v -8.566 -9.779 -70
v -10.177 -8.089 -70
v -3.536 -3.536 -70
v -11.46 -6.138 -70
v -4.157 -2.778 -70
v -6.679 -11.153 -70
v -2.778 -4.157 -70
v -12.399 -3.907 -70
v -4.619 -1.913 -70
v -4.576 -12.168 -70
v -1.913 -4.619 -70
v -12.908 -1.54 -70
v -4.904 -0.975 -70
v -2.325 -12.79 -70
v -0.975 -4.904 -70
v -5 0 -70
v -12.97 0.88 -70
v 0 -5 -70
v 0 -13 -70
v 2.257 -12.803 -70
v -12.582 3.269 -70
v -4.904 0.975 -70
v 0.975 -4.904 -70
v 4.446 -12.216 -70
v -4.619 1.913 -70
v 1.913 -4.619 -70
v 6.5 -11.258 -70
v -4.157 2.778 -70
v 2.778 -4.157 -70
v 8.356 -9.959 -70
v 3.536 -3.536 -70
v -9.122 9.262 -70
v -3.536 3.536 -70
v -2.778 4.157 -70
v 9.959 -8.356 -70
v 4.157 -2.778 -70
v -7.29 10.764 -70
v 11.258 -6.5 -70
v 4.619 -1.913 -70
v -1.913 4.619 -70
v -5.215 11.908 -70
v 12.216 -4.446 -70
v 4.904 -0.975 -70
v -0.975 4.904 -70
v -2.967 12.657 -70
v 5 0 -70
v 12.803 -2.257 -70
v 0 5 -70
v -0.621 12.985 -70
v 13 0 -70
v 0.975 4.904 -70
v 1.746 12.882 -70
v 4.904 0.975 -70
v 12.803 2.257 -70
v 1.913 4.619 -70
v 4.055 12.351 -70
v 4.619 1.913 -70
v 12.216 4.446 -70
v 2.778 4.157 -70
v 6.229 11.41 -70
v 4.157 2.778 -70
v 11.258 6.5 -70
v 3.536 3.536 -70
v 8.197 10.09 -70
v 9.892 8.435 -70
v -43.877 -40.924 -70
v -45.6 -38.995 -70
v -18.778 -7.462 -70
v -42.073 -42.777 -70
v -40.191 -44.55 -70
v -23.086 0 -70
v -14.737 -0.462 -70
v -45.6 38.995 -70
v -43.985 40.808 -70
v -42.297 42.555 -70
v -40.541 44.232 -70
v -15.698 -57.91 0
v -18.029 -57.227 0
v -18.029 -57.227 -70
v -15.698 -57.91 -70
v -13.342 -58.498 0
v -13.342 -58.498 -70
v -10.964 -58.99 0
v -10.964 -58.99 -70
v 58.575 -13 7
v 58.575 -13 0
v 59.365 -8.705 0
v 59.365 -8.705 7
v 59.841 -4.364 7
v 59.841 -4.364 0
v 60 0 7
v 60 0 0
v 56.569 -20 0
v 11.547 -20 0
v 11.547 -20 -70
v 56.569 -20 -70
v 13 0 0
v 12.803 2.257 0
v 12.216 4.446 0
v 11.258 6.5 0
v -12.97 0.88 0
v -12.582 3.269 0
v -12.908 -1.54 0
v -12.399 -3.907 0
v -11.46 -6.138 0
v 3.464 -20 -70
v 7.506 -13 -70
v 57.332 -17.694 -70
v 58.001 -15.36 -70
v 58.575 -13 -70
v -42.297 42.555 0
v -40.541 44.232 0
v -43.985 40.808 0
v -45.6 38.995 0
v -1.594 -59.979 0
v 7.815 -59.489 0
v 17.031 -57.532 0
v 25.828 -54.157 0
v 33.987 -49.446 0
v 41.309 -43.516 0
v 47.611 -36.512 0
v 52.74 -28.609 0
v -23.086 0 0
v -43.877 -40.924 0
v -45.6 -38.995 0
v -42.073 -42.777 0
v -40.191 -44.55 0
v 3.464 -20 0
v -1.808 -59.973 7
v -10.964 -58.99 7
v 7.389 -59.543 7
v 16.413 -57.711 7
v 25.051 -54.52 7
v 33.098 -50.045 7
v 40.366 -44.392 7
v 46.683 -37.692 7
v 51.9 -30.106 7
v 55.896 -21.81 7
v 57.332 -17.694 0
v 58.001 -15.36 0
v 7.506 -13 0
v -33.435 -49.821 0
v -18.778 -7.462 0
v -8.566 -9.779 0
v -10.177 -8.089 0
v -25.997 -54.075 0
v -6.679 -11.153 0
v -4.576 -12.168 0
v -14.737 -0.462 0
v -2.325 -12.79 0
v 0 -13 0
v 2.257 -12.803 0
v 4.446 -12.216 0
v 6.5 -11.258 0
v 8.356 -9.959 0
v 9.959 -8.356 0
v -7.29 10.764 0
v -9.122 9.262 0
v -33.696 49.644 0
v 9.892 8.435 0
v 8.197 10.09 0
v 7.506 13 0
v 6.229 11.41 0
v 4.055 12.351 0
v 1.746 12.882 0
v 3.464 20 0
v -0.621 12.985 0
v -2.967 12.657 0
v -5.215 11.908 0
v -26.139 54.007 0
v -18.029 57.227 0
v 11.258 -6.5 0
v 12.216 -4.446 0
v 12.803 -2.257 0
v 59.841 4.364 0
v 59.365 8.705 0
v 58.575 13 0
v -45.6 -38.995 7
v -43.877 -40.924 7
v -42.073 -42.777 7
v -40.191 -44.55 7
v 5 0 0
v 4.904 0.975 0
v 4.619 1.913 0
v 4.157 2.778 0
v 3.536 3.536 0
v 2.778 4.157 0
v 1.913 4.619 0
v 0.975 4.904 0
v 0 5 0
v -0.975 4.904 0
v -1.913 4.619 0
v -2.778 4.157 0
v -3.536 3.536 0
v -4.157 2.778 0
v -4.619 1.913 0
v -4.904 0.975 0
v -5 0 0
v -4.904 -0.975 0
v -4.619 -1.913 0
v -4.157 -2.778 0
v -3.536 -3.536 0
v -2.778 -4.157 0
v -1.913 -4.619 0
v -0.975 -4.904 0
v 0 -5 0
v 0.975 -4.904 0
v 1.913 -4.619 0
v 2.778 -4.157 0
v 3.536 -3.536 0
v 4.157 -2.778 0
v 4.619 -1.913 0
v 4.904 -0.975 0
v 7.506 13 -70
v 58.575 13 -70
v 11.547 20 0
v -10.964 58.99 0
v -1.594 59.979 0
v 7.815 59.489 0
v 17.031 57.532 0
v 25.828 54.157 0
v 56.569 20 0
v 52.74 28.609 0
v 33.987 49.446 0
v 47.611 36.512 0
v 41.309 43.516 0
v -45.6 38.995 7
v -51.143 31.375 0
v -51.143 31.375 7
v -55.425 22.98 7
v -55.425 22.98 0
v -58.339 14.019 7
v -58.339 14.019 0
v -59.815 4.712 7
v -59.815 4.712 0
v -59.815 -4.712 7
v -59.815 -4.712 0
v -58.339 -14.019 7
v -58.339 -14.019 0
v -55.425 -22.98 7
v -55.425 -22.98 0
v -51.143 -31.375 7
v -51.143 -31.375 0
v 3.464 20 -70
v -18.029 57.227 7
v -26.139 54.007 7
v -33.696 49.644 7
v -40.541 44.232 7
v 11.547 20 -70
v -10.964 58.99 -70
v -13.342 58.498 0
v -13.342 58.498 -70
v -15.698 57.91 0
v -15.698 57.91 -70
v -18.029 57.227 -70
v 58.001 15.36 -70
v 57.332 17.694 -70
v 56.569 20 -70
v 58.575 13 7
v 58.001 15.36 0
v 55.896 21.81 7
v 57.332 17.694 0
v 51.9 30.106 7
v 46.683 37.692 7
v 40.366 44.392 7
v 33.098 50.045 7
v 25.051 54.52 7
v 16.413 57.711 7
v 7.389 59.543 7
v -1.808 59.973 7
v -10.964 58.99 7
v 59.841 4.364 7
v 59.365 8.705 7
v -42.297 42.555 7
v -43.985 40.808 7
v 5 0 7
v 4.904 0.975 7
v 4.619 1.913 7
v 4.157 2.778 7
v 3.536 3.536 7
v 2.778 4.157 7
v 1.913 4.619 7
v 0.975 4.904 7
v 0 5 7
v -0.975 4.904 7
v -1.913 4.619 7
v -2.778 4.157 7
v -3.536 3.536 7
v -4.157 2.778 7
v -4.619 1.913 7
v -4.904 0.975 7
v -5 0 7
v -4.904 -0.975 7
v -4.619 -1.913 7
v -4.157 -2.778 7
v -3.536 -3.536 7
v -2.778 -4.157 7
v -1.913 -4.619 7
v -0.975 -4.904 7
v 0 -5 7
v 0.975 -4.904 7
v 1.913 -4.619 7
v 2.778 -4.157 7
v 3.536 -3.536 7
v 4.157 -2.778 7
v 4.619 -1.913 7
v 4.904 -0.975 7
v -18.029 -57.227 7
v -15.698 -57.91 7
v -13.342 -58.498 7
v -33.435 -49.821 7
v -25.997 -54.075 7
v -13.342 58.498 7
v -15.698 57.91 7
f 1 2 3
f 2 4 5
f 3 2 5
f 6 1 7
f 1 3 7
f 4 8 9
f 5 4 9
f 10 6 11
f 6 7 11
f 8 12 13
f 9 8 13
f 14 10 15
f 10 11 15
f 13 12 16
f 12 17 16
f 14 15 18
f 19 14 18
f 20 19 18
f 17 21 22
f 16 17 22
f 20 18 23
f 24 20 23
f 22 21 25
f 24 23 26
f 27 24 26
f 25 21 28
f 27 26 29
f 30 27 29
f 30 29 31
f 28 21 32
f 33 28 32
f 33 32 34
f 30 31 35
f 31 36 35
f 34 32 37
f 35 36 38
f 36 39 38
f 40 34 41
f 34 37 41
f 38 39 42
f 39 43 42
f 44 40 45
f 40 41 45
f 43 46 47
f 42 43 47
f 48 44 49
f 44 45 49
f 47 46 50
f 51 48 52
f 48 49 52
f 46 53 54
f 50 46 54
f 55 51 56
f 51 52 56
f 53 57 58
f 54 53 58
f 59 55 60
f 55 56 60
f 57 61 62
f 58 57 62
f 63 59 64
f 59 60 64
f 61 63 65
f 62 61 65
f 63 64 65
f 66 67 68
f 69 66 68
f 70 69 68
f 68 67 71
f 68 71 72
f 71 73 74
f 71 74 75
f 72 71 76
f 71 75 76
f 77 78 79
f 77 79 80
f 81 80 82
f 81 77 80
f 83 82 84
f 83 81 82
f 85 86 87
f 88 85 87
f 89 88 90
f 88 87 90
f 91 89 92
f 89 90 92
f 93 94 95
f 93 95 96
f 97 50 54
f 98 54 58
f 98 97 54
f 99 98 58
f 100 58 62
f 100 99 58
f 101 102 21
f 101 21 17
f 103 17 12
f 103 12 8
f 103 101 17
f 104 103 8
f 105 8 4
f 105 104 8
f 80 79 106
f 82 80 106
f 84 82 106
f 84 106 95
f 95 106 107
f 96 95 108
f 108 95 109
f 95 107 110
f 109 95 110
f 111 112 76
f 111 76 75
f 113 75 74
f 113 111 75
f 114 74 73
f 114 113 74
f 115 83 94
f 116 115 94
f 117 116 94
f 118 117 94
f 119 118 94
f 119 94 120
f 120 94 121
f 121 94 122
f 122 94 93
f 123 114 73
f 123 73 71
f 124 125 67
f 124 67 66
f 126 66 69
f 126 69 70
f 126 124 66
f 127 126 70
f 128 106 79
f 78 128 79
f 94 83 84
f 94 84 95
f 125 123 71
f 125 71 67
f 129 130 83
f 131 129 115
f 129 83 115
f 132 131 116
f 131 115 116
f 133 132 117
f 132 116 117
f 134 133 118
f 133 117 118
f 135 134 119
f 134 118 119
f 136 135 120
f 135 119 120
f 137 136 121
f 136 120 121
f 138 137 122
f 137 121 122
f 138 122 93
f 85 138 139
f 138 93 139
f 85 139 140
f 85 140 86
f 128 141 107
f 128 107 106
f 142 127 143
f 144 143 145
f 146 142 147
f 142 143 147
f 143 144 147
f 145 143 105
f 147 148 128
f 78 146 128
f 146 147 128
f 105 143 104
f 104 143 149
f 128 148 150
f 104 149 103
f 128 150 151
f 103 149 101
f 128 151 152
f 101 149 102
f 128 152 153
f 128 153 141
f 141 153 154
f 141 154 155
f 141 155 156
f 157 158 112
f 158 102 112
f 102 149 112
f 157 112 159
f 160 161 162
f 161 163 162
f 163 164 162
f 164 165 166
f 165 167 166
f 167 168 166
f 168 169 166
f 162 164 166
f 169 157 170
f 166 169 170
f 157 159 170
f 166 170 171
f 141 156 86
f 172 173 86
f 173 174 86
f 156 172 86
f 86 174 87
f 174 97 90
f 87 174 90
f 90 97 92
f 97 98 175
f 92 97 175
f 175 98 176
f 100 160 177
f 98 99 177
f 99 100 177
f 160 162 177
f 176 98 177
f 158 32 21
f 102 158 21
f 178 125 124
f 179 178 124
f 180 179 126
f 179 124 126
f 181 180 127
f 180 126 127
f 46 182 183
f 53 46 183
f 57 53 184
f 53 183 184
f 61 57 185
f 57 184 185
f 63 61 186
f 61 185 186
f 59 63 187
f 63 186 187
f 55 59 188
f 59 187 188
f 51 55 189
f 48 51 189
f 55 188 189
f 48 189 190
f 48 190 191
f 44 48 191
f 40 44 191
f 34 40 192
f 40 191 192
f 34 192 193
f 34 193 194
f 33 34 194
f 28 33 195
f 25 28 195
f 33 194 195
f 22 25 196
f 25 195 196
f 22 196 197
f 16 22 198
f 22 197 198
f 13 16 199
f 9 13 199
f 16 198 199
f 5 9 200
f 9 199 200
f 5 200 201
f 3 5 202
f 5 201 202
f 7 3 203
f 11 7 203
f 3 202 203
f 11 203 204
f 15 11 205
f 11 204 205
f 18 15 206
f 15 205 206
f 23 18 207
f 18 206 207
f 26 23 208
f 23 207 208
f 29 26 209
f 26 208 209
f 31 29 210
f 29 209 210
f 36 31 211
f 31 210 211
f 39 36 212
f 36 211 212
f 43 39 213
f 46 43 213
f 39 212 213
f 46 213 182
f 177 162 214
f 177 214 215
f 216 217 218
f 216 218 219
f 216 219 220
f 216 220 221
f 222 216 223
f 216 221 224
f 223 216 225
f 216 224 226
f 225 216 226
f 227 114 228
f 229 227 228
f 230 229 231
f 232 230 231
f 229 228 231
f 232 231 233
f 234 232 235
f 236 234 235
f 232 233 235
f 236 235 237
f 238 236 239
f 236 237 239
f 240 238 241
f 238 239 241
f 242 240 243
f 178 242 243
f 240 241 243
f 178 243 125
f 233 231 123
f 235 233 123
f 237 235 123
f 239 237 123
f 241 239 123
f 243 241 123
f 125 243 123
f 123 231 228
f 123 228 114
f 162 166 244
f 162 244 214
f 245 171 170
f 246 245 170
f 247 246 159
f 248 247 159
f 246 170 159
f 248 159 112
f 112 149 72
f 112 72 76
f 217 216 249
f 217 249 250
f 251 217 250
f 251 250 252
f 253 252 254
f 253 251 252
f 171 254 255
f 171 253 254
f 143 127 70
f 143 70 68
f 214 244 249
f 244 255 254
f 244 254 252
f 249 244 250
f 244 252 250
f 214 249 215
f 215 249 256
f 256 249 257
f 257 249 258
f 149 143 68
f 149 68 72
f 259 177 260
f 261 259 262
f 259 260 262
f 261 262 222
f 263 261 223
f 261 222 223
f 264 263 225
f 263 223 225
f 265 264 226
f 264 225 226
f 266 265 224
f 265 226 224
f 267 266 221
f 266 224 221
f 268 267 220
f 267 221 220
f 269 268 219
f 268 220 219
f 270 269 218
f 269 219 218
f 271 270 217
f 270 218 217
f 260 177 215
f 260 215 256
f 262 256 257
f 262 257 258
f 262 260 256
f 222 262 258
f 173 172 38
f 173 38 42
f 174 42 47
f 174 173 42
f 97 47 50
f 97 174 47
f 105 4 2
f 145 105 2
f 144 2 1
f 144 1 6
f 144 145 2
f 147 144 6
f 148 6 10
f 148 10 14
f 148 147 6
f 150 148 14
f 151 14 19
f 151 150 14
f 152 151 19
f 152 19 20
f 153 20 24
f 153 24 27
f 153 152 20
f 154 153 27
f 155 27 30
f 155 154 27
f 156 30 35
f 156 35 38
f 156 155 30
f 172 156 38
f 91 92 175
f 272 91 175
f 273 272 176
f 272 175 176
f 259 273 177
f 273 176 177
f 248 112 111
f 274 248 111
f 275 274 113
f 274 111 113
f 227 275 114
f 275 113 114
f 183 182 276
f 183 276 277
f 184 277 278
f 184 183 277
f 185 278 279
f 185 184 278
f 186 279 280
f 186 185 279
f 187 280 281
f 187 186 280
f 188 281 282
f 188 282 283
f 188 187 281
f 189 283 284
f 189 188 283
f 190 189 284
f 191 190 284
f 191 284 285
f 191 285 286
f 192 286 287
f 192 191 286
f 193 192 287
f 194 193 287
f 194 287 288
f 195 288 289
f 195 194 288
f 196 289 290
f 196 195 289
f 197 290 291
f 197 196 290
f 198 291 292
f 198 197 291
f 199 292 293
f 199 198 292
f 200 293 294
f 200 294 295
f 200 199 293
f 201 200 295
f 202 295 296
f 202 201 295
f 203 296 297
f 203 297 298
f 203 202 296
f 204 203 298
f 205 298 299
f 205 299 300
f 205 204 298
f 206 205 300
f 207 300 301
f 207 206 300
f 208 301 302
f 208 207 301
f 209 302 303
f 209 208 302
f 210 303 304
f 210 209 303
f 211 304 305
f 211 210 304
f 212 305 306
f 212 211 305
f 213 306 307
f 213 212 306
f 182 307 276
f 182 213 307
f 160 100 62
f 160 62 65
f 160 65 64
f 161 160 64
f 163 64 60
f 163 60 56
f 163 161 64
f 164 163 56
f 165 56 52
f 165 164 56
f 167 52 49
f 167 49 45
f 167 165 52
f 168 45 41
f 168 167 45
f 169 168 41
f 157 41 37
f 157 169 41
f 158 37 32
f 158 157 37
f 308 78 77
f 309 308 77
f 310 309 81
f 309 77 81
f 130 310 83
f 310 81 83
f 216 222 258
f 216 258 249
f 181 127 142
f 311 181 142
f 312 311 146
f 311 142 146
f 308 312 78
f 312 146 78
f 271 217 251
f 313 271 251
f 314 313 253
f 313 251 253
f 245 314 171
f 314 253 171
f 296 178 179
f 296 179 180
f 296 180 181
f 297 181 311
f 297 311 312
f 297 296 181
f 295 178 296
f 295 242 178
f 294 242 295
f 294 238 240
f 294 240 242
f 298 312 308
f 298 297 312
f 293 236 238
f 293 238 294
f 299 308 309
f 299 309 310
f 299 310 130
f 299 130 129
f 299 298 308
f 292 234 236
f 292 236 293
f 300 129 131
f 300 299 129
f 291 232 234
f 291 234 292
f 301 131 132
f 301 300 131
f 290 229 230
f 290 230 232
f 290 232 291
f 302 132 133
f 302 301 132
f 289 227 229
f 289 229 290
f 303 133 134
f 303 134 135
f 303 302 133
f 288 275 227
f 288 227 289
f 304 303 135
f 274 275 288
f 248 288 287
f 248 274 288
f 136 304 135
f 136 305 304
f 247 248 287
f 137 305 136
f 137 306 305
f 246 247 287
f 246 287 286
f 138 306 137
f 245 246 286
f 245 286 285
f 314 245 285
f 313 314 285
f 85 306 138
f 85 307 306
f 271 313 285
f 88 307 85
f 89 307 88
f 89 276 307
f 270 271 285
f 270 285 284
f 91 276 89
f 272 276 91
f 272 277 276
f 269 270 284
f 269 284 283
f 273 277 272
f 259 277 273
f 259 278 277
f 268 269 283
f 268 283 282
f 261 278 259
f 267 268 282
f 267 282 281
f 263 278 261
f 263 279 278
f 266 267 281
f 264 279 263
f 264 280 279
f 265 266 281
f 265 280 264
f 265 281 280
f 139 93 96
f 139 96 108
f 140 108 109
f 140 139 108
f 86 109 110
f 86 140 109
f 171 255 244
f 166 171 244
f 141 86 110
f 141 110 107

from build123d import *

# Parameters (mm, degrees)
F0_R     = 5
F1_DEPTH = 7
F2_DEPTH = 70


# Not quite as in the source:
# - after a boolean that leaves OpenCascade's solid faulty, fix() repairs it


with BuildPart() as f1:
    # F0 (on Top) → F1 (new body)
    with BuildSketch(Plane.XY):
        with BuildLine():
            Line((11.5470053838, 20), (56.5685424949, 20))
            ThreePointArc((56.5685424949, 20), (30, 51.9615242271), (-10.9637631718, 58.9897948557))
            Line((-10.9637631718, 58.9897948557), (11.5470053838, 20))
        make_face()
        with BuildLine():
            ThreePointArc((-10.9637631718, -58.9897948557), (30, -51.9615242271), (56.5685424949, -20))
            Line((56.5685424949, -20), (11.5470053838, -20))
            Line((11.5470053838, -20), (-10.9637631718, -58.9897948557))
        make_face()
        with BuildLine():
            ThreePointArc((58.5747385824, -13), (59.6426203103, -6.5389481208), (60, 0))
            ThreePointArc((60, 0), (59.6426203103, 6.5389481208), (58.5747385824, 13))
            Line((58.5747385824, 13), (15.5884572681, 13))
            Line((15.5884572681, 13), (7.5055534995, 13))
            Line((7.5055534995, 13), (11.2583302492, 6.5))
            ThreePointArc((11.2583302492, 6.5), (12.5570357418, 3.3646475863), (13, 0))
            ThreePointArc((13, 0), (12.5570357418, -3.3646475863), (11.2583302492, -6.5))
            Line((11.2583302492, -6.5), (7.5055534995, -13))
            Line((7.5055534995, -13), (15.5884572681, -13))
            Line((15.5884572681, -13), (58.5747385824, -13))
        make_face()
        with BuildLine():
            ThreePointArc((56.5685424949, -20), (57.6779316057, -16.5304629604), (58.5747385824, -13))
            Line((58.5747385824, -13), (15.5884572681, -13))
            Line((15.5884572681, -13), (11.5470053838, -20))
            Line((11.5470053838, -20), (56.5685424949, -20))
        make_face()
        with BuildLine():
            Line((15.5884572681, 13), (58.5747385824, 13))
            ThreePointArc((58.5747385824, 13), (57.6779316057, 16.5304629604), (56.5685424949, 20))
            Line((56.5685424949, 20), (11.5470053838, 20))
            Line((11.5470053838, 20), (15.5884572681, 13))
        make_face()
        with BuildLine():
            Line((3.4641016151, -20), (7.5055534995, -13))
            Line((7.5055534995, -13), (0, -13))
            ThreePointArc((0, -13), (-6.6785653008, -11.1533297953), (-11.4597294399, -6.1379639265))
            Line((-11.4597294399, -6.1379639265), (-14.736550409, -0.4623435209))
            Line((-14.736550409, -0.4623435209), (-18.7780022933, -7.4623435209))
            Line((-18.7780022933, -7.4623435209), (-40.1906368837, -44.5501145553))
            ThreePointArc((-40.1906368837, -44.5501145553), (-29.7919429343, -52.081091926), (-18.029039042, -57.2272116324))
            Line((-18.029039042, -57.2272116324), (3.4641016151, -20))
        make_face()
        with BuildLine():
            Line((-14.736550409, -0.4623435209), (-40.5407150531, 44.2317806897))
            ThreePointArc((-40.5407150531, 44.2317806897), (-43.1499853268, 41.6902718424), (-45.6002292233, 38.995116294))
            Line((-45.6002292233, 38.995116294), (-23.0863883339, 0))
            Line((-23.0863883339, 0), (-18.7780022933, -7.4623435209))
            Line((-18.7780022933, -7.4623435209), (-14.736550409, -0.4623435209))
        make_face()
        with BuildLine():
            Line((0, 13), (7.5055534995, 13))
            Line((7.5055534995, 13), (3.4641016151, 20))
            Line((3.4641016151, 20), (-18.029039042, 57.2272116324))
            ThreePointArc((-18.029039042, 57.2272116324), (-29.9970720244, 51.9632145846), (-40.5407150531, 44.2317806897))
            Line((-40.5407150531, 44.2317806897), (-14.736550409, -0.4623435209))
            Line((-14.736550409, -0.4623435209), (-12.5822883529, 3.2689478131))
            ThreePointArc((-12.5822883529, 3.2689478131), (-11.2583302492, 6.5), (-9.1221360262, 9.2621074448))
            ThreePointArc((-9.1221360262, 9.2621074448), (-4.9291278751, 12.0292850324), (0, 13))
        make_face()
        with BuildLine():
            Line((-23.0863883339, 0), (-45.6002292233, 38.995116294))
            ThreePointArc((-45.6002292233, 38.995116294), (-60, 0), (-45.6002292233, -38.995116294))
            Line((-45.6002292233, -38.995116294), (-23.0863883339, 0))
        make_face()
        with BuildLine():
            Line((11.5470053838, 20), (-10.9637631718, 58.9897948557))
            ThreePointArc((-10.9637631718, 58.9897948557), (-14.5231649428, 58.2157854885), (-18.029039042, 57.2272116324))
            Line((-18.029039042, 57.2272116324), (3.4641016151, 20))
            Line((3.4641016151, 20), (11.5470053838, 20))
        make_face()
        with BuildLine():
            ThreePointArc((-45.6002292233, -38.995116294), (-42.9852611748, -41.8600922328), (-40.1906368837, -44.5501145553))
            Line((-40.1906368837, -44.5501145553), (-18.7780022933, -7.4623435209))
            Line((-18.7780022933, -7.4623435209), (-23.0863883339, 0))
            Line((-23.0863883339, 0), (-45.6002292233, -38.995116294))
        make_face()
        with BuildLine():
            ThreePointArc((-18.029039042, -57.2272116324), (-14.5231649428, -58.2157854885), (-10.9637631718, -58.9897948557))
            Line((-10.9637631718, -58.9897948557), (11.5470053838, -20))
            Line((11.5470053838, -20), (3.4641016151, -20))
            Line((3.4641016151, -20), (-18.029039042, -57.2272116324))
        make_face()
        Polygon((11.5470053838, -20), (15.5884572681, -13), (7.5055534995, -13), (3.4641016151, -20), align=None)
        Polygon((7.5055534995, 13), (15.5884572681, 13), (11.5470053838, 20), (3.4641016151, 20), align=None)
        with BuildLine():
            Line((0, -13), (7.5055534995, -13))
            Line((7.5055534995, -13), (11.2583302492, -6.5))
            ThreePointArc((11.2583302492, -6.5), (6.5, -11.2583302492), (0, -13))
        make_face()
        with BuildLine():
            Line((-12.5822883529, 3.2689478131), (-9.1221360262, 9.2621074448))
            ThreePointArc((-9.1221360262, 9.2621074448), (-11.2583302492, 6.5), (-12.5822883529, 3.2689478131))
        make_face()
        with BuildLine():
            Line((11.2583302492, 6.5), (7.5055534995, 13))
            Line((7.5055534995, 13), (0, 13))
            ThreePointArc((0, 13), (6.5, 11.2583302492), (11.2583302492, 6.5))
        make_face()
        with BuildLine():
            Line((-14.736550409, -0.4623435209), (-11.4597294399, -6.1379639265))
            ThreePointArc((-11.4597294399, -6.1379639265), (-12.9084140005, -1.5404051392), (-12.5822883529, 3.2689478131))
            Line((-12.5822883529, 3.2689478131), (-14.736550409, -0.4623435209))
        make_face()
        with BuildLine():
            ThreePointArc((11.2583302492, 6.5), (6.5, 11.2583302492), (0, 13))
            ThreePointArc((0, 13), (-4.9291278751, 12.0292850324), (-9.1221360262, 9.2621074448))
            Line((-9.1221360262, 9.2621074448), (-12.5822883529, 3.2689478131))
            ThreePointArc((-12.5822883529, 3.2689478131), (-12.9084140005, -1.5404051392), (-11.4597294399, -6.1379639265))
            ThreePointArc((-11.4597294399, -6.1379639265), (-6.6785653008, -11.1533297953), (0, -13))
            ThreePointArc((0, -13), (6.5, -11.2583302492), (11.2583302492, -6.5))
            ThreePointArc((11.2583302492, -6.5), (12.5570357418, -3.3646475863), (13, 0))
            ThreePointArc((13, 0), (12.5570357418, 3.3646475863), (11.2583302492, 6.5))
        make_face()
        Circle(F0_R, mode=Mode.SUBTRACT)
    extrude(amount=F1_DEPTH)

    # F0 (on Top) → F2 (join)
    with BuildSketch(Plane.XY):
        with BuildLine():
            ThreePointArc((56.5685424949, -20), (57.6779316057, -16.5304629604), (58.5747385824, -13))
            Line((58.5747385824, -13), (15.5884572681, -13))
            Line((15.5884572681, -13), (11.5470053838, -20))
            Line((11.5470053838, -20), (56.5685424949, -20))
        make_face()
        Polygon((11.5470053838, -20), (15.5884572681, -13), (7.5055534995, -13), (3.4641016151, -20), align=None)
        with BuildLine():
            ThreePointArc((-18.029039042, -57.2272116324), (-14.5231649428, -58.2157854885), (-10.9637631718, -58.9897948557))
            Line((-10.9637631718, -58.9897948557), (11.5470053838, -20))
            Line((11.5470053838, -20), (3.4641016151, -20))
            Line((3.4641016151, -20), (-18.029039042, -57.2272116324))
        make_face()
        with BuildLine():
            ThreePointArc((-45.6002292233, -38.995116294), (-42.9852611748, -41.8600922328), (-40.1906368837, -44.5501145553))
            Line((-40.1906368837, -44.5501145553), (-18.7780022933, -7.4623435209))
            Line((-18.7780022933, -7.4623435209), (-23.0863883339, 0))
            Line((-23.0863883339, 0), (-45.6002292233, -38.995116294))
        make_face()
        with BuildLine():
            Line((-14.736550409, -0.4623435209), (-40.5407150531, 44.2317806897))
            ThreePointArc((-40.5407150531, 44.2317806897), (-43.1499853268, 41.6902718424), (-45.6002292233, 38.995116294))
            Line((-45.6002292233, 38.995116294), (-23.0863883339, 0))
            Line((-23.0863883339, 0), (-18.7780022933, -7.4623435209))
            Line((-18.7780022933, -7.4623435209), (-14.736550409, -0.4623435209))
        make_face()
        with BuildLine():
            Line((11.5470053838, 20), (-10.9637631718, 58.9897948557))
            ThreePointArc((-10.9637631718, 58.9897948557), (-14.5231649428, 58.2157854885), (-18.029039042, 57.2272116324))
            Line((-18.029039042, 57.2272116324), (3.4641016151, 20))
            Line((3.4641016151, 20), (11.5470053838, 20))
        make_face()
        Polygon((7.5055534995, 13), (15.5884572681, 13), (11.5470053838, 20), (3.4641016151, 20), align=None)
        with BuildLine():
            Line((15.5884572681, 13), (58.5747385824, 13))
            ThreePointArc((58.5747385824, 13), (57.6779316057, 16.5304629604), (56.5685424949, 20))
            Line((56.5685424949, 20), (11.5470053838, 20))
            Line((11.5470053838, 20), (15.5884572681, 13))
        make_face()
        with BuildLine():
            ThreePointArc((11.2583302492, 6.5), (6.5, 11.2583302492), (0, 13))
            ThreePointArc((0, 13), (-4.9291278751, 12.0292850324), (-9.1221360262, 9.2621074448))
            Line((-9.1221360262, 9.2621074448), (-12.5822883529, 3.2689478131))
            ThreePointArc((-12.5822883529, 3.2689478131), (-12.9084140005, -1.5404051392), (-11.4597294399, -6.1379639265))
            ThreePointArc((-11.4597294399, -6.1379639265), (-6.6785653008, -11.1533297953), (0, -13))
            ThreePointArc((0, -13), (6.5, -11.2583302492), (11.2583302492, -6.5))
            ThreePointArc((11.2583302492, -6.5), (12.5570357418, -3.3646475863), (13, 0))
            ThreePointArc((13, 0), (12.5570357418, 3.3646475863), (11.2583302492, 6.5))
        make_face()
        Circle(F0_R, mode=Mode.SUBTRACT)
    extrude(amount=-F2_DEPTH)

    add(f1.part.fix(), mode=Mode.REPLACE)


solid = f1.part
